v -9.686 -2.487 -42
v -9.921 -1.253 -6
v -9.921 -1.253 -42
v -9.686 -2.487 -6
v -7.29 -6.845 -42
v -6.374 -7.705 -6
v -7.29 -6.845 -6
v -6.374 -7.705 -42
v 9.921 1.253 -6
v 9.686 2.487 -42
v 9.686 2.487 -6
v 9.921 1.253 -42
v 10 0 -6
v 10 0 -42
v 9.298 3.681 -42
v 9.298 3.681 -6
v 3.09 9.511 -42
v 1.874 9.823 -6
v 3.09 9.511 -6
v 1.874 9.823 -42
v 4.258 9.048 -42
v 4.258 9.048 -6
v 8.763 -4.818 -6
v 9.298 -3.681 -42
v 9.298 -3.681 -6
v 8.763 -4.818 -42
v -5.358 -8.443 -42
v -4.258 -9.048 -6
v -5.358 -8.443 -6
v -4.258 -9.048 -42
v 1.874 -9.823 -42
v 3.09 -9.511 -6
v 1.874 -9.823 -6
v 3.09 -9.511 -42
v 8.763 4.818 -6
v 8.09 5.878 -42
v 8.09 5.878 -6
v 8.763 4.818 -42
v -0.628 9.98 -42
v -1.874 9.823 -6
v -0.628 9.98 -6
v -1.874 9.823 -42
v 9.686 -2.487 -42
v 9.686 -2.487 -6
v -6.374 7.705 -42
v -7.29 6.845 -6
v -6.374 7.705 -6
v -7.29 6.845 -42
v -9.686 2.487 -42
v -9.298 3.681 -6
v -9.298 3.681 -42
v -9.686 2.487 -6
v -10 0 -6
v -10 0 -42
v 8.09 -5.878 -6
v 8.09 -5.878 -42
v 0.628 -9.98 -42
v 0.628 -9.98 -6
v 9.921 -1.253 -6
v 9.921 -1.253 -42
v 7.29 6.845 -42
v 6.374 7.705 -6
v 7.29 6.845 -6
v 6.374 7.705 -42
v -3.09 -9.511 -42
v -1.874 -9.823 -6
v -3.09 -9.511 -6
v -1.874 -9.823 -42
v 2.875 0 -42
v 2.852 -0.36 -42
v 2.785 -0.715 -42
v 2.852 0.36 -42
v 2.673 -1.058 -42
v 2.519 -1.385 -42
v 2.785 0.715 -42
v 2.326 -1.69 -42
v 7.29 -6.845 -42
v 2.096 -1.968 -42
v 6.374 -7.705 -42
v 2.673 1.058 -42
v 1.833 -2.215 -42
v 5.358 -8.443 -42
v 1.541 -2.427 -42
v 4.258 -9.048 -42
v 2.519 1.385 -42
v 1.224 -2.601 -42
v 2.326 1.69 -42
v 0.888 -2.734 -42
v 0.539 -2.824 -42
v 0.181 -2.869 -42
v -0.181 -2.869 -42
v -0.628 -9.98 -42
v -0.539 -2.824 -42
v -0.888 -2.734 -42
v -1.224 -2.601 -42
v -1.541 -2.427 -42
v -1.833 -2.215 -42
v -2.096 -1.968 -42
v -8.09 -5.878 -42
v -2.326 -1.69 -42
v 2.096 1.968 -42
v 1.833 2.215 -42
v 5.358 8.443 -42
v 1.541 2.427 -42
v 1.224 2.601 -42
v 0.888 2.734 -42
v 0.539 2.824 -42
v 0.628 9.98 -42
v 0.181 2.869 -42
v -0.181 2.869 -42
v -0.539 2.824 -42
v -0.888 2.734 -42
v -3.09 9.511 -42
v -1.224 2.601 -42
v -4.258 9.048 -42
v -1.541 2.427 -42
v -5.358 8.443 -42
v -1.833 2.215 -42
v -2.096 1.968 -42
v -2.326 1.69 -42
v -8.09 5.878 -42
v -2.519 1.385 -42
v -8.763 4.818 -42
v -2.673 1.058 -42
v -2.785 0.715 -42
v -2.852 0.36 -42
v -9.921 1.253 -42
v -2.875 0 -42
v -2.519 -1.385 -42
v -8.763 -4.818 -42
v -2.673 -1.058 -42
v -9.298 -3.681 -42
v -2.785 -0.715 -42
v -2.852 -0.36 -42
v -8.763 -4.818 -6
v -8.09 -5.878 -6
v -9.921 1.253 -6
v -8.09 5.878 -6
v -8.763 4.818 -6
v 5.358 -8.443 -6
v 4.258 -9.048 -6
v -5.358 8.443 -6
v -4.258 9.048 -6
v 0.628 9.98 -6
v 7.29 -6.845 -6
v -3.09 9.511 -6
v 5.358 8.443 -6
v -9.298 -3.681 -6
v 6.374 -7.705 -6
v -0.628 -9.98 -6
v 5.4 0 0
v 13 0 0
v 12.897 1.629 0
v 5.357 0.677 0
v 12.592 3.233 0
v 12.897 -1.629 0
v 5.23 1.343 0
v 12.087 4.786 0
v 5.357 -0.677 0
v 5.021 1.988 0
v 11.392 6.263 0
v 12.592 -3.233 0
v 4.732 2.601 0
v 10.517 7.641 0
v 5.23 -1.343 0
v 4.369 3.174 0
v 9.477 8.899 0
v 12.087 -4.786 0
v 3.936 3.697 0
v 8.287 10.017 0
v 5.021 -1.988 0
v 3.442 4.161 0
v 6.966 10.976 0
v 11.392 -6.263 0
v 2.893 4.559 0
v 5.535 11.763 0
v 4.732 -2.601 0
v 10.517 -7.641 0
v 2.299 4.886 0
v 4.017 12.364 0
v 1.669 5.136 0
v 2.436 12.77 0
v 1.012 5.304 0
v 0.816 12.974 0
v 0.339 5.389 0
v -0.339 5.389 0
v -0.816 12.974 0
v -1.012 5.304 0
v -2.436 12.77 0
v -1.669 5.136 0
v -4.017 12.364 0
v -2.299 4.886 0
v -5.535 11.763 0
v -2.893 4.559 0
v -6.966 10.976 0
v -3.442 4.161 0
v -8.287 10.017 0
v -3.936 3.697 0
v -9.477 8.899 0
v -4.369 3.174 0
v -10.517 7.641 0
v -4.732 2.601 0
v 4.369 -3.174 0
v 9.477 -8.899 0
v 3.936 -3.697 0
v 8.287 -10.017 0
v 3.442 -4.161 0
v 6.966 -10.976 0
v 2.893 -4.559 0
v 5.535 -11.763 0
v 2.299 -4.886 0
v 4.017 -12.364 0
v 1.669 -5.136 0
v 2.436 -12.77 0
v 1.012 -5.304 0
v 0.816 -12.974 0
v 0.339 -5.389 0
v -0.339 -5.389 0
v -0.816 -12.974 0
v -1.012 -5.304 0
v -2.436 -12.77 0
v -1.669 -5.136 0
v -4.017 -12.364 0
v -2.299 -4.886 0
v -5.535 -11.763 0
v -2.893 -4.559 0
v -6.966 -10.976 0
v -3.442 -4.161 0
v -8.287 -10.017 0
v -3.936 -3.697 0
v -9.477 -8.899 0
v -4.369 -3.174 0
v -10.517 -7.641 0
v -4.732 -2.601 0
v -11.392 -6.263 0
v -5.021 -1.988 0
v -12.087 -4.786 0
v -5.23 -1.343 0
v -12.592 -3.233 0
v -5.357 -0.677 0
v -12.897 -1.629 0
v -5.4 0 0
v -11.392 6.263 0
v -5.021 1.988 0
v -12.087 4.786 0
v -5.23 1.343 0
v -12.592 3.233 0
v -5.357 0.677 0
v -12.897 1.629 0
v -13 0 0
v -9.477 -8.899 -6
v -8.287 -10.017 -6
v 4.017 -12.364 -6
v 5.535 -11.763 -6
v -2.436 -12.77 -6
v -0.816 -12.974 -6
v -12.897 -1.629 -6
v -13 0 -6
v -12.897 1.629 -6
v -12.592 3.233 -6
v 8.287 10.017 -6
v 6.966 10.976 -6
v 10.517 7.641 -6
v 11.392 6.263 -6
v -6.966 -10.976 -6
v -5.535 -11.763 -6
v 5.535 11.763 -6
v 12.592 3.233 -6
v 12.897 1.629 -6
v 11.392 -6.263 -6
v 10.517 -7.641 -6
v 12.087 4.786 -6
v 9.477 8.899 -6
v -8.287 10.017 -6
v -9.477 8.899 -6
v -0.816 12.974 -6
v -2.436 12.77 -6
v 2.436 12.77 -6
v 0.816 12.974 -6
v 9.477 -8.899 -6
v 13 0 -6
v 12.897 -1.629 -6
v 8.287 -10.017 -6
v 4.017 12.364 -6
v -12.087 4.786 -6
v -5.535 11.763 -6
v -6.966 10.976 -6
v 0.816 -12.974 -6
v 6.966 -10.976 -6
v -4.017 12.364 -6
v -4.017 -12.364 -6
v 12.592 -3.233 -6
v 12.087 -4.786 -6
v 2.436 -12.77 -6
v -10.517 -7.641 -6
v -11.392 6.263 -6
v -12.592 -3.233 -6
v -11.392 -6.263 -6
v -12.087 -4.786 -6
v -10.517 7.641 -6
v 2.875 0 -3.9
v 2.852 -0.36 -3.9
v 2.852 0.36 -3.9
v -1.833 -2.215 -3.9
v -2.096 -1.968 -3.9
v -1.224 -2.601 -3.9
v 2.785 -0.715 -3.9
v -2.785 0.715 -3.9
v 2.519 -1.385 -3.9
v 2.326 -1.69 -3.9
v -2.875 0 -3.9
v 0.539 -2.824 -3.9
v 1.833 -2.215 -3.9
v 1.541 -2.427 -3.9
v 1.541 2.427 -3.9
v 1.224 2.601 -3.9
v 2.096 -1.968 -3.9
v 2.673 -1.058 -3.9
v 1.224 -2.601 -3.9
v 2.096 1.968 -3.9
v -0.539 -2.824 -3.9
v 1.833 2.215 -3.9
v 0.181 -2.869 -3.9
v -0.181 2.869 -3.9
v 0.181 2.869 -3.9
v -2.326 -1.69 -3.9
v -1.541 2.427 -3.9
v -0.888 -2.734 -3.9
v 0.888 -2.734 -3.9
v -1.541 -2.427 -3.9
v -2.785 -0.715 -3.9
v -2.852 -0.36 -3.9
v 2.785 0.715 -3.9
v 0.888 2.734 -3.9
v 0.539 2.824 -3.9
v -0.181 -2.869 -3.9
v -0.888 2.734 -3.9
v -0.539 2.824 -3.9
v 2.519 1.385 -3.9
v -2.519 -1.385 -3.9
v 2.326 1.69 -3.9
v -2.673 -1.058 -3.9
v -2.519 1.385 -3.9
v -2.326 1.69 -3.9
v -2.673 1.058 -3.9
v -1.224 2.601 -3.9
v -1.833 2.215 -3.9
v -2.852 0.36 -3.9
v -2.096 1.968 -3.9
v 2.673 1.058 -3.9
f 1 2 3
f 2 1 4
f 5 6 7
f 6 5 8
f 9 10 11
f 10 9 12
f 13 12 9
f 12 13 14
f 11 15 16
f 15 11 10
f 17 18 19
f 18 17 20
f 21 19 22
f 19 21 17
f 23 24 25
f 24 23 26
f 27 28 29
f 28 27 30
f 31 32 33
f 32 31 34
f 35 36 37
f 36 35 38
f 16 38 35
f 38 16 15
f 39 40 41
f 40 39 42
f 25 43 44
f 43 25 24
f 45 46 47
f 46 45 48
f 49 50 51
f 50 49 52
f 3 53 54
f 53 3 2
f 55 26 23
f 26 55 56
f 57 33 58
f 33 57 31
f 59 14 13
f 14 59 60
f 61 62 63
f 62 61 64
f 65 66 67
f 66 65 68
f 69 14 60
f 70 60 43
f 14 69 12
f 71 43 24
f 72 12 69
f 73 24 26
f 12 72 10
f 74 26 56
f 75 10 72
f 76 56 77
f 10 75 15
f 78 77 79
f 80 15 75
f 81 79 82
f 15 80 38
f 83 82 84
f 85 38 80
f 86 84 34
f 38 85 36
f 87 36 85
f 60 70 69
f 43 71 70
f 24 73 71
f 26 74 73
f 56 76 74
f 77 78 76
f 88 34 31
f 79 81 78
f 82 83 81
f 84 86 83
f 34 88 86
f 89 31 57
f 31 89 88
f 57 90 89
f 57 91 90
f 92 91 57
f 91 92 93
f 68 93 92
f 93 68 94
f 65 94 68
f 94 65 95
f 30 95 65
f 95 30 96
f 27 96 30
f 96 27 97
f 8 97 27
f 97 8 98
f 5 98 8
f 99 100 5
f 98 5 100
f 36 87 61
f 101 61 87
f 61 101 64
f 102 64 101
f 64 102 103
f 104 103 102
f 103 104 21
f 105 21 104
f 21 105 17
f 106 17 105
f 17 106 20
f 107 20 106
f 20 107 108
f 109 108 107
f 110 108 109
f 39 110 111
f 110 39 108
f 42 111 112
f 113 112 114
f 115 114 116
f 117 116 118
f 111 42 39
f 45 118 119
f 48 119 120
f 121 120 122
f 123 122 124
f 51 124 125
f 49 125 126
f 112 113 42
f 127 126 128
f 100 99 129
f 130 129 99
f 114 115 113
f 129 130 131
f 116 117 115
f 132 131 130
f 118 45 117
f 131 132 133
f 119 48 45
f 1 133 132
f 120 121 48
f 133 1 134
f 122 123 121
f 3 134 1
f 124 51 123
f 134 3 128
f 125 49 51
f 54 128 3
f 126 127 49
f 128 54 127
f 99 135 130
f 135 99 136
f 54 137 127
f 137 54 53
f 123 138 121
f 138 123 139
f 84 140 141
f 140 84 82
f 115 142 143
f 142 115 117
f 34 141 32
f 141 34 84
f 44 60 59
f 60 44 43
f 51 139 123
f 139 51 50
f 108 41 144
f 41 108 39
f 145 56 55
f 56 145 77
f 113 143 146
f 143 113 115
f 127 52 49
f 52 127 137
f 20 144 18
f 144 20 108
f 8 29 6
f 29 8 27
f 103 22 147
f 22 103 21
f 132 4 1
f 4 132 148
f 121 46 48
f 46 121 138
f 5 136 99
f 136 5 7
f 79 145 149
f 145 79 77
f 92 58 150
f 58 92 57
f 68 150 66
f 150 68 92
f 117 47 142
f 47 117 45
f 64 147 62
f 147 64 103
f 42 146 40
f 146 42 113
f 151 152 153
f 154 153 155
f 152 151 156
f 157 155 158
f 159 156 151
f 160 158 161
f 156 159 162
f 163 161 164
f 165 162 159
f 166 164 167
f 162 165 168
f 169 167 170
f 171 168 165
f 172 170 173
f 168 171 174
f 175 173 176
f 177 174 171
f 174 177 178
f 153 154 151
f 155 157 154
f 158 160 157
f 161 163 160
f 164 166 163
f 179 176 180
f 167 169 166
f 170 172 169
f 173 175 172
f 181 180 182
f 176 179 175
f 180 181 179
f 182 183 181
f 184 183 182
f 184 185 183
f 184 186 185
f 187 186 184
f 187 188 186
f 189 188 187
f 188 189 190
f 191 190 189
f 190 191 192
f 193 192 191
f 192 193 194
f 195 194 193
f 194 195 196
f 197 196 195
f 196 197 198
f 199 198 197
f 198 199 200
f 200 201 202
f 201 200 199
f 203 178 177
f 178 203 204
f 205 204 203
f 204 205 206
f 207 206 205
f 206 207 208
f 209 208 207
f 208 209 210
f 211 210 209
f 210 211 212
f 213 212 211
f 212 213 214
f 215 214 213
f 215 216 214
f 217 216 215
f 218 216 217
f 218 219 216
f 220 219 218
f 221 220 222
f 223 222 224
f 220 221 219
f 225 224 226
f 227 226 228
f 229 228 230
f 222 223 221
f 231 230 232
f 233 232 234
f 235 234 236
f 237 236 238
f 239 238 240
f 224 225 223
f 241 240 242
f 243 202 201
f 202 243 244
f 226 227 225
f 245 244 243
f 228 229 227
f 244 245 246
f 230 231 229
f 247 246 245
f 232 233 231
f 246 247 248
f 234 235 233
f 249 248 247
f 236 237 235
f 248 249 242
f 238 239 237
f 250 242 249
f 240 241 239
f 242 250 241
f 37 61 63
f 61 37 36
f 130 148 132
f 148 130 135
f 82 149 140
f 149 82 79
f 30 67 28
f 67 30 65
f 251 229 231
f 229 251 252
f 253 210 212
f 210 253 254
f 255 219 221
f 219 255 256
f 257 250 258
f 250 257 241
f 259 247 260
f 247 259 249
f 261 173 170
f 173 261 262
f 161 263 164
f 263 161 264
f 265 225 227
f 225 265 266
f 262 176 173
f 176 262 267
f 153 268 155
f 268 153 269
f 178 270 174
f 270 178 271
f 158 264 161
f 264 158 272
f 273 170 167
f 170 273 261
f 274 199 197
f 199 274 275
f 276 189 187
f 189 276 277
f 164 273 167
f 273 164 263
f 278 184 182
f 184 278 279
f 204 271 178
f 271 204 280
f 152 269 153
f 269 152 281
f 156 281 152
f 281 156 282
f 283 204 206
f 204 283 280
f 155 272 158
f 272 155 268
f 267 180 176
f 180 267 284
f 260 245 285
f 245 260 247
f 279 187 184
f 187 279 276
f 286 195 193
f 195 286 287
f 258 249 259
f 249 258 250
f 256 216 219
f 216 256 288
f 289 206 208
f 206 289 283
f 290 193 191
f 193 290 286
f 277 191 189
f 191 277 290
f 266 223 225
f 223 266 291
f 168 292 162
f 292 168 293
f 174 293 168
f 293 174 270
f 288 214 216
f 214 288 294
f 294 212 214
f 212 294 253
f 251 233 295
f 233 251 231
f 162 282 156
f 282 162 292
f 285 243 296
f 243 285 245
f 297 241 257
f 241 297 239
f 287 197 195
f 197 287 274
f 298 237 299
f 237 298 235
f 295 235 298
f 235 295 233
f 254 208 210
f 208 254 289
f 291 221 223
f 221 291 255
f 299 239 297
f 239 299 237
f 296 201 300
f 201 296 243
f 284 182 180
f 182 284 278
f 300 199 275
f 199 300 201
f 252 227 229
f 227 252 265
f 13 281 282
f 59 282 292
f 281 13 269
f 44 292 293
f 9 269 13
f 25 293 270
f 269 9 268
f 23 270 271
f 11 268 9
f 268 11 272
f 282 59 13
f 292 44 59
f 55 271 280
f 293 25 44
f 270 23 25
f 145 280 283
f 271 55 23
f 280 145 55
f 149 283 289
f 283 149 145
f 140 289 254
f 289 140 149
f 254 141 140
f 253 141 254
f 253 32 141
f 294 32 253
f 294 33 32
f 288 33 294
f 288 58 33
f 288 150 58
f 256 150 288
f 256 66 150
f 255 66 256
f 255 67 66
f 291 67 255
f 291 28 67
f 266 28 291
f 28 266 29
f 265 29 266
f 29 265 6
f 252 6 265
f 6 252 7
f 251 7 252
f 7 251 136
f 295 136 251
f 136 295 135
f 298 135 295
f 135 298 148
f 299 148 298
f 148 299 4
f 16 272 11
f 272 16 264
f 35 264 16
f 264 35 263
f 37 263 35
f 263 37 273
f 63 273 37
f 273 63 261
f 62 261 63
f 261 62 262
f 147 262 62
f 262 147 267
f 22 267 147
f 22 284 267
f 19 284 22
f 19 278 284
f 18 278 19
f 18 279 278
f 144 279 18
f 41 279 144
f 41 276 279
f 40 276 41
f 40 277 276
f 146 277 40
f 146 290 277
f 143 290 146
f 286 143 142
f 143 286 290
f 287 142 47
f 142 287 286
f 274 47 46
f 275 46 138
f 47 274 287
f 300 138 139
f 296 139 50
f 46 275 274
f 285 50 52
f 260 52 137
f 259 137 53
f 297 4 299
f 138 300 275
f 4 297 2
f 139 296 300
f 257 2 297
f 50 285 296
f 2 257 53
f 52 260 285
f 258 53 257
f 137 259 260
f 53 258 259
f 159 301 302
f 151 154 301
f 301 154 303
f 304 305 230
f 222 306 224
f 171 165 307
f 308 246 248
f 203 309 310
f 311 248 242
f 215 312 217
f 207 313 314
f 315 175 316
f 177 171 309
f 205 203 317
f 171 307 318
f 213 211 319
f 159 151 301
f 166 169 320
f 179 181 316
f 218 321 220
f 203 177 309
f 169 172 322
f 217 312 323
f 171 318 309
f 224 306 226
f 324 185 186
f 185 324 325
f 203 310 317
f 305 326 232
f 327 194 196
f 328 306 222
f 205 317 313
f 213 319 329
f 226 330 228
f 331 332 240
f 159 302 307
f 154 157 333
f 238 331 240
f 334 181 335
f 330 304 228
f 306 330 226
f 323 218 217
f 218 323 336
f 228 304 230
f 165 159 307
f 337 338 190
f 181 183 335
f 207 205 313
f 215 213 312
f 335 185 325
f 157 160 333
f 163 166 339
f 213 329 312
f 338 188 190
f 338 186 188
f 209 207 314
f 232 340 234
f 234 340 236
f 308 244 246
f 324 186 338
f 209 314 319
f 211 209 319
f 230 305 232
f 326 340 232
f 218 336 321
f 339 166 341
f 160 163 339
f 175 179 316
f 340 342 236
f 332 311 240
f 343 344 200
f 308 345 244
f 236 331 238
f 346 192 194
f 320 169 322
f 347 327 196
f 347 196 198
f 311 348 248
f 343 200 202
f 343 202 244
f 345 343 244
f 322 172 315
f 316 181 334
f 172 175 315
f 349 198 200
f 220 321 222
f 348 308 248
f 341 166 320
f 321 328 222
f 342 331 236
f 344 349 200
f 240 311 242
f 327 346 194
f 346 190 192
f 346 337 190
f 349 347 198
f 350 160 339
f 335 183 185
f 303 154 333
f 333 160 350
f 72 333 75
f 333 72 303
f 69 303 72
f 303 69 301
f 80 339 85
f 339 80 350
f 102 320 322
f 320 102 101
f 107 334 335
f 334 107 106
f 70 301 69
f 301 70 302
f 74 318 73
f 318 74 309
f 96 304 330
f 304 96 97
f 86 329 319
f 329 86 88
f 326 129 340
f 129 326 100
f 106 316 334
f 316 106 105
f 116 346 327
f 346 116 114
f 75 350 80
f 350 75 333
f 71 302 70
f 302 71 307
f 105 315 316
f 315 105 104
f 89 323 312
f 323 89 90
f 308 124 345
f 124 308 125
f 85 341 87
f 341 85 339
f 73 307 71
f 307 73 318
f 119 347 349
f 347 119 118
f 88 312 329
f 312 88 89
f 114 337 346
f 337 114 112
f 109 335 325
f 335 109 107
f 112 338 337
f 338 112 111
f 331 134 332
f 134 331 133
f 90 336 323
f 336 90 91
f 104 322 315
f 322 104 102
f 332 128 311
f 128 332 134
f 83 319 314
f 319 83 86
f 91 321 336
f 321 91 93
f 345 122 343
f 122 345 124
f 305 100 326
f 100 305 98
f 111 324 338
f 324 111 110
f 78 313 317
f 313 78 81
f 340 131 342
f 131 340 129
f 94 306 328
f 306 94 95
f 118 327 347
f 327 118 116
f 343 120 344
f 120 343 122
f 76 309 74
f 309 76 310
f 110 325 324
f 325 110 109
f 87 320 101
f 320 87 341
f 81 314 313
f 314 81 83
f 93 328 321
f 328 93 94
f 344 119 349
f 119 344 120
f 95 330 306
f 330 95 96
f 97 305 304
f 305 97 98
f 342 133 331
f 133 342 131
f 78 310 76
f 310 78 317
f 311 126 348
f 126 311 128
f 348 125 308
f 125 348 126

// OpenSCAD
$fn = 50;


difference() {
	union() {
		translate(v = [0, 0, -42.0000000000]) {
			cylinder(h = 42, r = 10.0000000000);
		}
		translate(v = [0, 0, -6.0000000000]) {
			cylinder(h = 6, r = 13.0000000000);
		}
	}
	union() {
		translate(v = [0, 0, 0]) {
			rotate(a = [0, 0, 0]) {
				difference() {
					union() {
						#translate(v = [0, 0, -42.0000000000]) {
							cylinder(h = 42, r = 2.6000000000);
						}
						#translate(v = [0, 0, -3.9000000000]) {
							cylinder(h = 3.9000000000, r1 = 2.8750000000, r2 = 5.4000000000);
						}
						#translate(v = [0, 0, -42.0000000000]) {
							cylinder(h = 42, r = 2.8750000000);
						}
						#translate(v = [0, 0, -42.0000000000]) {
							cylinder(h = 42, r = 2.6000000000);
						}
					}
					union();
				}
			}
		}
	}
}
